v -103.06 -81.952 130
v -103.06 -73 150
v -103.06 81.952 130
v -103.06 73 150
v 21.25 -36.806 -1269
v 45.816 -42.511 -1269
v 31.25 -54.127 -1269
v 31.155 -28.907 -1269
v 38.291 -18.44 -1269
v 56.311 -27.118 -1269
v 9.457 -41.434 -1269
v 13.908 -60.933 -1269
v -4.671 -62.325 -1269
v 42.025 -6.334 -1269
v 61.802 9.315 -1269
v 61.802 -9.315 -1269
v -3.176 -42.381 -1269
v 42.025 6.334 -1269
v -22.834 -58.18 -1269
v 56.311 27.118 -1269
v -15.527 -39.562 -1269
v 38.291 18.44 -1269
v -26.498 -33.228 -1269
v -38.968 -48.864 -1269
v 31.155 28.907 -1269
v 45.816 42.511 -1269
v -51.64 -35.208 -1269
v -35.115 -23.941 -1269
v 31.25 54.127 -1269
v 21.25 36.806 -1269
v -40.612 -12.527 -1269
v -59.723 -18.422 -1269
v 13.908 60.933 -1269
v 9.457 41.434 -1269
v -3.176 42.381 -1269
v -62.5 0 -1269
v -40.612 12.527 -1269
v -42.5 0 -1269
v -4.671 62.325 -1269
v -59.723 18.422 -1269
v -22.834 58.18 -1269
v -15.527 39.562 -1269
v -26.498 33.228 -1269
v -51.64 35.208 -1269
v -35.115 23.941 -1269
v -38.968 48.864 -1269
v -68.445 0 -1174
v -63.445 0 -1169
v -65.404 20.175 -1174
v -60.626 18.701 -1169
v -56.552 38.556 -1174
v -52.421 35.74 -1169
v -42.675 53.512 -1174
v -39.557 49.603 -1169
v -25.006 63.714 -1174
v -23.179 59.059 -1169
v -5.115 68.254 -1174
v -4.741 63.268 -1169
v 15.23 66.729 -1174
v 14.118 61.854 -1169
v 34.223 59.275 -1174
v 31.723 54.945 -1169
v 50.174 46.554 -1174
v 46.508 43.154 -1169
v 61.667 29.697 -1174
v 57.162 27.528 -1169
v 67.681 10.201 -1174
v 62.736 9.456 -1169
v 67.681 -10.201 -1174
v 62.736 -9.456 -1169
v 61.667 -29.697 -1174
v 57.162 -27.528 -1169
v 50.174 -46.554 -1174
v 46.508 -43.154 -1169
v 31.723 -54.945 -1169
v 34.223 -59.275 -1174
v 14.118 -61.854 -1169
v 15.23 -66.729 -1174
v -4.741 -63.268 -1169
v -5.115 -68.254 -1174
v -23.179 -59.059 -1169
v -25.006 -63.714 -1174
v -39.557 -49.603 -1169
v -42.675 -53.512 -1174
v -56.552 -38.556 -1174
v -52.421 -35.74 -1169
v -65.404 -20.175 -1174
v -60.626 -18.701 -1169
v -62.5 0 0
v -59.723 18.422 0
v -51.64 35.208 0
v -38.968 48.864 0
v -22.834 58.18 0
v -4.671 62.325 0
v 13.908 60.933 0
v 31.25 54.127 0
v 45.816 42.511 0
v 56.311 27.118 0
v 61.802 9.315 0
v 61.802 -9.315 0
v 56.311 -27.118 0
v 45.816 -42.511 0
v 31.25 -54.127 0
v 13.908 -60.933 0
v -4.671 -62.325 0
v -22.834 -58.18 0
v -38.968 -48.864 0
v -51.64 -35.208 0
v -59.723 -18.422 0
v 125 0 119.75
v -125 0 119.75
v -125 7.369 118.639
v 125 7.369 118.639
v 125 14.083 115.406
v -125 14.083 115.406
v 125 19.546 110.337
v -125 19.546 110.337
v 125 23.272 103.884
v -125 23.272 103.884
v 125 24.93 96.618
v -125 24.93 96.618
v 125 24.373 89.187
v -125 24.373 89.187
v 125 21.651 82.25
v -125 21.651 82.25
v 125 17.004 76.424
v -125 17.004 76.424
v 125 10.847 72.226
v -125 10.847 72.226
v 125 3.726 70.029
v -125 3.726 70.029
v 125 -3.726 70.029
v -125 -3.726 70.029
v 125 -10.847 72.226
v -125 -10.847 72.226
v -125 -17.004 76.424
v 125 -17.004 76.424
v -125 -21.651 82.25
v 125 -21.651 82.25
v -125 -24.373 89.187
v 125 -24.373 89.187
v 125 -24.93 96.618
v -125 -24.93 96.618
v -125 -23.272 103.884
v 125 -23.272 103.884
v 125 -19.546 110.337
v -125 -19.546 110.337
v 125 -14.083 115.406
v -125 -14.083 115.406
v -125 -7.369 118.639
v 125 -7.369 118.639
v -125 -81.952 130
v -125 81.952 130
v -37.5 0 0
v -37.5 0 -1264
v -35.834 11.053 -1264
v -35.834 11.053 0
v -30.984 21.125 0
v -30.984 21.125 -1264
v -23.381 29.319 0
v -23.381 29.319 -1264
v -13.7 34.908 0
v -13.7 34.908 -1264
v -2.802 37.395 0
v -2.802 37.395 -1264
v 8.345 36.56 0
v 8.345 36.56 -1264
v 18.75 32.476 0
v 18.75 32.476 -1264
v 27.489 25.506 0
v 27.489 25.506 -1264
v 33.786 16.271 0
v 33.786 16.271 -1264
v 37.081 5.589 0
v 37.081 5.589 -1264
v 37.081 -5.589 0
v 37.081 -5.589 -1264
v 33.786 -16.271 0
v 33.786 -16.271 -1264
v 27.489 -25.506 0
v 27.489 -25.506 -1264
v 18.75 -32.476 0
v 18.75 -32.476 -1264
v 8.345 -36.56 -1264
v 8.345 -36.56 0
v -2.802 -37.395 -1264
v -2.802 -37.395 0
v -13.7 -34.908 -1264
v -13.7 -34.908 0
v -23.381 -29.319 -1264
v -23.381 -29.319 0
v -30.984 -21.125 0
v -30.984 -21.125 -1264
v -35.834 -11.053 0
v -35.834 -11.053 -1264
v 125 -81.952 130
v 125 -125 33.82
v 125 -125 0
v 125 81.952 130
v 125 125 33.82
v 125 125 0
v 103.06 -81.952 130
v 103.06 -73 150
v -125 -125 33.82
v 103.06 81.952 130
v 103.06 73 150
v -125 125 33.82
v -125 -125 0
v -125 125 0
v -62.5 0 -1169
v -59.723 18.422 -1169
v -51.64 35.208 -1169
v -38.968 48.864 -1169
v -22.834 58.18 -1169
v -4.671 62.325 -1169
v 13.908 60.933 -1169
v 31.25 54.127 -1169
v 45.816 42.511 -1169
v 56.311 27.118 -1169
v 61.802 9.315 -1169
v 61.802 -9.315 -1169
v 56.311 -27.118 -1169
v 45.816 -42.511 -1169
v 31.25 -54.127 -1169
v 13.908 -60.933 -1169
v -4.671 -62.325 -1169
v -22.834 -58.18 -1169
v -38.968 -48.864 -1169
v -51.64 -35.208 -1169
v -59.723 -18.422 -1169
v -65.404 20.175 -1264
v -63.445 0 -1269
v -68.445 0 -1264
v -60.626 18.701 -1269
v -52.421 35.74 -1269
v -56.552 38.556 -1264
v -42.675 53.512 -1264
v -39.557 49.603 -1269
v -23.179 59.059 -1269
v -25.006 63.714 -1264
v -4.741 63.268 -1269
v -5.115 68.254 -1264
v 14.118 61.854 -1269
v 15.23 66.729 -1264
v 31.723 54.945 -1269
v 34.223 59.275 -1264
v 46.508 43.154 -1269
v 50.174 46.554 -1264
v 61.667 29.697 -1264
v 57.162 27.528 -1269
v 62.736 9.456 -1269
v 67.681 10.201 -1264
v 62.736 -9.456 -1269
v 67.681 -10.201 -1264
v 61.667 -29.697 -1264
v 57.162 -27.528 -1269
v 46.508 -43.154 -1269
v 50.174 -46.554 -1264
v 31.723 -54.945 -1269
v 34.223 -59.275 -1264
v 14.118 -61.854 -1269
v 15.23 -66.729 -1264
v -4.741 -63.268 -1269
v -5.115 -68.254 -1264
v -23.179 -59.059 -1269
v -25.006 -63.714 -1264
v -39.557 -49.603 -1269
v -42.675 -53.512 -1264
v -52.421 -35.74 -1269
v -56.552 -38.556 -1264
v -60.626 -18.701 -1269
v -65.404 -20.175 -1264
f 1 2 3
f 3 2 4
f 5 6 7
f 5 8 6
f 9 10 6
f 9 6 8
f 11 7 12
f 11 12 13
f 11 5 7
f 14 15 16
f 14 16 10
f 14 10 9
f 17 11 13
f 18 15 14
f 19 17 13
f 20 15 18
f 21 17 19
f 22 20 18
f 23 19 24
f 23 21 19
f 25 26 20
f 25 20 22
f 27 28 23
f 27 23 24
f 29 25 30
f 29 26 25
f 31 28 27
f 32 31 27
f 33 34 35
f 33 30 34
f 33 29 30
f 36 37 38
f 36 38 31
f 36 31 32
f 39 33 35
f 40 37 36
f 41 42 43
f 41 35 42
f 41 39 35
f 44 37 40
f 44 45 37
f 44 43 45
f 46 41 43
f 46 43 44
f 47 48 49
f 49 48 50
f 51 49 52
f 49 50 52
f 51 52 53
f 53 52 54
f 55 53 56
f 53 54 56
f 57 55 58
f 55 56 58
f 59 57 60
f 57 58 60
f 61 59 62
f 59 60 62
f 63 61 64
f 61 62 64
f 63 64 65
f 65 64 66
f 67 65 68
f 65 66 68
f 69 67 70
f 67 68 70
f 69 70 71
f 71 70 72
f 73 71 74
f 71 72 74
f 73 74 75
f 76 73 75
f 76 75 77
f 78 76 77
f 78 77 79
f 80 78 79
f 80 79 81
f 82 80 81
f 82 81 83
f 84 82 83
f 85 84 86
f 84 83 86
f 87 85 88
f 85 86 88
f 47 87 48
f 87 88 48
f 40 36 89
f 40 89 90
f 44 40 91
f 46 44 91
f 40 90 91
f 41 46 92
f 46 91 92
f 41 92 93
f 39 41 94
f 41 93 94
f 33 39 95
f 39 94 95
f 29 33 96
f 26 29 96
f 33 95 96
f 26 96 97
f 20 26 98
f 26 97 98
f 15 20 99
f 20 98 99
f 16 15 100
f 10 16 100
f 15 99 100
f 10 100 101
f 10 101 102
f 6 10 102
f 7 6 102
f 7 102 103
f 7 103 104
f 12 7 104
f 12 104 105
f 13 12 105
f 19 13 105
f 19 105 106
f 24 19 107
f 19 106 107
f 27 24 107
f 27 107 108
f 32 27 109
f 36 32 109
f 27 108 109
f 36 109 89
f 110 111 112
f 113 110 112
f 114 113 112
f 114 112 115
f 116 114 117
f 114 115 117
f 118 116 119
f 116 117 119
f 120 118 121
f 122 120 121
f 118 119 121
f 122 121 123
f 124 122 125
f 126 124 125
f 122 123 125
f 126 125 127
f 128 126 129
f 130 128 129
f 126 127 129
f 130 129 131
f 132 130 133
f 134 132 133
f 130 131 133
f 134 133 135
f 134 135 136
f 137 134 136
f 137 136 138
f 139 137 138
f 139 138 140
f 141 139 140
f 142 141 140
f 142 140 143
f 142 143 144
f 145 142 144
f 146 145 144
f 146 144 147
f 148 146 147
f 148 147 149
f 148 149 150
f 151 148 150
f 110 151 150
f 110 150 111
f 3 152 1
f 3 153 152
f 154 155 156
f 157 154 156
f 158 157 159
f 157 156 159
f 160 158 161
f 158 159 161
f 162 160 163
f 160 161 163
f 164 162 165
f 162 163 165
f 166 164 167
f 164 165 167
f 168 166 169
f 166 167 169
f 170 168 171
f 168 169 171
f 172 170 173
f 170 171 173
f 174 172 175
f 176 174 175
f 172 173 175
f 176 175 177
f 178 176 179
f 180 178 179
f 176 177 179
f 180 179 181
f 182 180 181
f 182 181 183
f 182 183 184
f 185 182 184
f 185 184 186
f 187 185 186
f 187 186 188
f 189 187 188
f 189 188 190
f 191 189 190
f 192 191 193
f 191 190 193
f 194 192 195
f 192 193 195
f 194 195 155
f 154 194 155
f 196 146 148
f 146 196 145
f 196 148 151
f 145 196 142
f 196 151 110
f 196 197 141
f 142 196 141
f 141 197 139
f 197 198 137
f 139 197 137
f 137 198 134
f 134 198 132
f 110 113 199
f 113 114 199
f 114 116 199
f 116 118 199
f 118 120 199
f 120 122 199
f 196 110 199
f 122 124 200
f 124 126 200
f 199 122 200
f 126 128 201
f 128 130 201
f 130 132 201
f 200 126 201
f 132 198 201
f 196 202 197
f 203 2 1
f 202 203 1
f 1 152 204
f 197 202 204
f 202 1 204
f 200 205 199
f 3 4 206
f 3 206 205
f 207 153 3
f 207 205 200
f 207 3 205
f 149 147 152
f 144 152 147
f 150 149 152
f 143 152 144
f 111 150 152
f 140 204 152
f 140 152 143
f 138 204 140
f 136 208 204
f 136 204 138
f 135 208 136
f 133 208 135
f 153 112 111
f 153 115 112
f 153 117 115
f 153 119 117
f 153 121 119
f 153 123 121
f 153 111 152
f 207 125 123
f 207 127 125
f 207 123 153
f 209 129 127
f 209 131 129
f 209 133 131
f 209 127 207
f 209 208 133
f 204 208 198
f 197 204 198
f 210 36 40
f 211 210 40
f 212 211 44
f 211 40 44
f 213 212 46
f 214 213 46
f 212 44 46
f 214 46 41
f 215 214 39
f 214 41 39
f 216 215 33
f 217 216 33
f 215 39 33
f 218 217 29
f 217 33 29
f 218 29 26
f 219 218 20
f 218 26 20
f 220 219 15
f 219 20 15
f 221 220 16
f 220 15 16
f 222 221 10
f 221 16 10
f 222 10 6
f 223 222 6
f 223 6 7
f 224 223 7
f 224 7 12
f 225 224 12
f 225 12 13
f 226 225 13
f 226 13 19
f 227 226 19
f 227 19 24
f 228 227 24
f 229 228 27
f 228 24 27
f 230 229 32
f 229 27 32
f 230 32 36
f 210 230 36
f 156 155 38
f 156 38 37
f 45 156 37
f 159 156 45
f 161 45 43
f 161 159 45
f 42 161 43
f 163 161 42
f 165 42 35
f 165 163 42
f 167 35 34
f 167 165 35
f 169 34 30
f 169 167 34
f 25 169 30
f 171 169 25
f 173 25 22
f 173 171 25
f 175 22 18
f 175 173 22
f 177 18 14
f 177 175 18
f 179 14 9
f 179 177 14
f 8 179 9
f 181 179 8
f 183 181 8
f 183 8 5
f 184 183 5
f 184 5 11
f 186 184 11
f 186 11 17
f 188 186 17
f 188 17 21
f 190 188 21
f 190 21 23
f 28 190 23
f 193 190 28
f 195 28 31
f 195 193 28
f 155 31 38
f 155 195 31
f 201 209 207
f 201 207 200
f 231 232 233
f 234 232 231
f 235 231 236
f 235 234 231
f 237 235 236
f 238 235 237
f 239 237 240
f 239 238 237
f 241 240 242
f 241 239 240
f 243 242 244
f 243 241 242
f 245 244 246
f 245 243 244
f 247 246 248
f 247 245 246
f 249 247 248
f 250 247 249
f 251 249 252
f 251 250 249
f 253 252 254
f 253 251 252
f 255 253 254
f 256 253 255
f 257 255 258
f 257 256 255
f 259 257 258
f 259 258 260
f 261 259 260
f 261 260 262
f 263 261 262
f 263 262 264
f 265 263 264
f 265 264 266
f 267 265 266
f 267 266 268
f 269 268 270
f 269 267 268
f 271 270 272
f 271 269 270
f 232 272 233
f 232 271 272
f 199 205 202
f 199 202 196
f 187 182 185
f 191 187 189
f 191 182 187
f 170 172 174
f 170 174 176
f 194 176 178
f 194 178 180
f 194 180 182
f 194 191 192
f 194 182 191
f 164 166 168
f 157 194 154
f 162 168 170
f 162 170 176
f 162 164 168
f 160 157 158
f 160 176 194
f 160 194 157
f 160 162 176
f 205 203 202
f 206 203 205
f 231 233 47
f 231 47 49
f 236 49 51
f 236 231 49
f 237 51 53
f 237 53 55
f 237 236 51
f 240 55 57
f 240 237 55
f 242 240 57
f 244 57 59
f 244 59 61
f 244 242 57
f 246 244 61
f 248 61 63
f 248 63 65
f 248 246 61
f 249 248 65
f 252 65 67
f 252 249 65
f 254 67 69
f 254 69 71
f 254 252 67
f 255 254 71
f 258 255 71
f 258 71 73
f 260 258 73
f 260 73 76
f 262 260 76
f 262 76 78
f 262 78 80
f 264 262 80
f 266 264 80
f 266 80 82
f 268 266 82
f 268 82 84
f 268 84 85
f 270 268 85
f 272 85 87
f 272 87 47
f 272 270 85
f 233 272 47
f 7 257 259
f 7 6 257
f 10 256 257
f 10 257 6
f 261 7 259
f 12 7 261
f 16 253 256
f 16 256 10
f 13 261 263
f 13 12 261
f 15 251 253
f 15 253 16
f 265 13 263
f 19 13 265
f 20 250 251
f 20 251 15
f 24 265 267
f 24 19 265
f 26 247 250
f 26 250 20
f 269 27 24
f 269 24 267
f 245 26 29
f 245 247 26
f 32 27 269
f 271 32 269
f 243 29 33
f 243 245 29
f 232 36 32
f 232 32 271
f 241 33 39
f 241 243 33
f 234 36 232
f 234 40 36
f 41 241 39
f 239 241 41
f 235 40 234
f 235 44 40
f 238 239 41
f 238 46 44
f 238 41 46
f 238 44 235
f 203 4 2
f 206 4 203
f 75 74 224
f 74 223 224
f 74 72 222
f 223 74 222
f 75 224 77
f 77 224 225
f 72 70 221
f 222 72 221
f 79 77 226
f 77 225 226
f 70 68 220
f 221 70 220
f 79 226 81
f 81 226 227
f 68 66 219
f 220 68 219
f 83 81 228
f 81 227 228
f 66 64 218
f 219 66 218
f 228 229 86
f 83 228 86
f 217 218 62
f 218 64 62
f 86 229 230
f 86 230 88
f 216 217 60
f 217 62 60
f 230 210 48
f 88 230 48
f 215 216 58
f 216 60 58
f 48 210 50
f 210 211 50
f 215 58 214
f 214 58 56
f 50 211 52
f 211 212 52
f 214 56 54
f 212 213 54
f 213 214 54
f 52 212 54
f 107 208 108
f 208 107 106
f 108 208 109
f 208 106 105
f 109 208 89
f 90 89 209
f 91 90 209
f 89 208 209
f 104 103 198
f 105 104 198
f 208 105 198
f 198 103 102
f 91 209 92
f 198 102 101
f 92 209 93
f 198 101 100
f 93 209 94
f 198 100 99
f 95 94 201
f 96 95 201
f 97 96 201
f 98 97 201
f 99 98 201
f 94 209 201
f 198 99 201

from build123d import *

# Parameters (mm, degrees)
SKETCH1_W           = 250
SKETCH1_H           = 250
BOSS_EXTRUDE1_DEPTH = 150
SKETCH2_R           = 62.5
BOSS_EXTRUDE2_DEPTH = 1269
SKETCH3_R           = 25
CUT_EXTRUDE1_DEPTH  = 1269
SKETCH4_R           = 37.5
CUT_EXTRUDE2_DEPTH  = 1269
SKETCH5_W           = 120.008707334
SKETCH5_H           = 350.62784974
SKETCH5_W_2         = 99.043330751
CUT_EXTRUDE3_DEPTH  = 20
SKETCH6_R           = 68.445
SKETCH6_R_2         = 62.5
BOSS_EXTRUDE3_DEPTH = 100
CHAMFER1_SIZE       = 5
CHAMFER2_SIZE       = 5


with BuildPart() as part:
    # Sketch1 → Boss-Extrude1 (new body)
    with BuildSketch(Plane.XY):
        Rectangle(SKETCH1_W, SKETCH1_H)
    extrude(amount=BOSS_EXTRUDE1_DEPTH)

    # Sketch2 → Boss-Extrude2 (add)
    with BuildSketch(Plane(origin=(0, 0, 0), x_dir=(-1, 0, 0), z_dir=(0, 0, -1))):
        Circle(SKETCH2_R)
    extrude(amount=BOSS_EXTRUDE2_DEPTH)

    # Sketch3 → Cut-Extrude1 (cut)
    with BuildSketch(Plane.ZY.offset(125)):
        with Locations((94.75, 0)):
            Circle(SKETCH3_R)
        Polygon((33.82, -125), (150, -125), (150, -73), align=None)
        Polygon((150, 125), (150, 73), (33.82, 125), align=None)
    extrude(amount=-CUT_EXTRUDE1_DEPTH, mode=Mode.SUBTRACT)

    # Sketch4 → Cut-Extrude2 (cut)
    with BuildSketch(Plane(origin=(0, 0, -1269), x_dir=(-1, 0, 0), z_dir=(0, 0, -1))):
        Circle(SKETCH4_R)
    extrude(amount=-CUT_EXTRUDE2_DEPTH, mode=Mode.SUBTRACT)

    # Sketch5 → Cut-Extrude3 (cut)
    with BuildSketch(Plane.XY.offset(150)):
        with Locations((-163.064353667, 15.904768442)):
            Rectangle(SKETCH5_W, SKETCH5_H)
        with Locations((152.581665375, 15.904768442)):
            Rectangle(SKETCH5_W_2, SKETCH5_H)
    extrude(amount=-CUT_EXTRUDE3_DEPTH, mode=Mode.SUBTRACT)

    # Chamfer2
    chamfer2_edges = [part.edges().sort_by_distance(p)[0] for p in [
        (37.5, 0, -1269),
    ]]
    chamfer(chamfer2_edges, length=CHAMFER2_SIZE)


with BuildPart() as body_2:
    # Sketch6 → Boss-Extrude3 (new body)
    with BuildSketch(Plane(origin=(0, 0, -1269), x_dir=(-1, 0, 0), z_dir=(0, 0, -1))):
        Circle(SKETCH6_R)
        Circle(SKETCH6_R_2, mode=Mode.SUBTRACT)
    extrude(amount=-BOSS_EXTRUDE3_DEPTH)

    # Chamfer1
    chamfer1_edges = [body_2.edges().sort_by_distance(p)[0] for p in [
        (68.445, 0, -1269),
        (68.445, 0, -1169),
    ]]
    chamfer(chamfer1_edges, length=CHAMFER1_SIZE)


solid = Compound([part.part, body_2.part])
